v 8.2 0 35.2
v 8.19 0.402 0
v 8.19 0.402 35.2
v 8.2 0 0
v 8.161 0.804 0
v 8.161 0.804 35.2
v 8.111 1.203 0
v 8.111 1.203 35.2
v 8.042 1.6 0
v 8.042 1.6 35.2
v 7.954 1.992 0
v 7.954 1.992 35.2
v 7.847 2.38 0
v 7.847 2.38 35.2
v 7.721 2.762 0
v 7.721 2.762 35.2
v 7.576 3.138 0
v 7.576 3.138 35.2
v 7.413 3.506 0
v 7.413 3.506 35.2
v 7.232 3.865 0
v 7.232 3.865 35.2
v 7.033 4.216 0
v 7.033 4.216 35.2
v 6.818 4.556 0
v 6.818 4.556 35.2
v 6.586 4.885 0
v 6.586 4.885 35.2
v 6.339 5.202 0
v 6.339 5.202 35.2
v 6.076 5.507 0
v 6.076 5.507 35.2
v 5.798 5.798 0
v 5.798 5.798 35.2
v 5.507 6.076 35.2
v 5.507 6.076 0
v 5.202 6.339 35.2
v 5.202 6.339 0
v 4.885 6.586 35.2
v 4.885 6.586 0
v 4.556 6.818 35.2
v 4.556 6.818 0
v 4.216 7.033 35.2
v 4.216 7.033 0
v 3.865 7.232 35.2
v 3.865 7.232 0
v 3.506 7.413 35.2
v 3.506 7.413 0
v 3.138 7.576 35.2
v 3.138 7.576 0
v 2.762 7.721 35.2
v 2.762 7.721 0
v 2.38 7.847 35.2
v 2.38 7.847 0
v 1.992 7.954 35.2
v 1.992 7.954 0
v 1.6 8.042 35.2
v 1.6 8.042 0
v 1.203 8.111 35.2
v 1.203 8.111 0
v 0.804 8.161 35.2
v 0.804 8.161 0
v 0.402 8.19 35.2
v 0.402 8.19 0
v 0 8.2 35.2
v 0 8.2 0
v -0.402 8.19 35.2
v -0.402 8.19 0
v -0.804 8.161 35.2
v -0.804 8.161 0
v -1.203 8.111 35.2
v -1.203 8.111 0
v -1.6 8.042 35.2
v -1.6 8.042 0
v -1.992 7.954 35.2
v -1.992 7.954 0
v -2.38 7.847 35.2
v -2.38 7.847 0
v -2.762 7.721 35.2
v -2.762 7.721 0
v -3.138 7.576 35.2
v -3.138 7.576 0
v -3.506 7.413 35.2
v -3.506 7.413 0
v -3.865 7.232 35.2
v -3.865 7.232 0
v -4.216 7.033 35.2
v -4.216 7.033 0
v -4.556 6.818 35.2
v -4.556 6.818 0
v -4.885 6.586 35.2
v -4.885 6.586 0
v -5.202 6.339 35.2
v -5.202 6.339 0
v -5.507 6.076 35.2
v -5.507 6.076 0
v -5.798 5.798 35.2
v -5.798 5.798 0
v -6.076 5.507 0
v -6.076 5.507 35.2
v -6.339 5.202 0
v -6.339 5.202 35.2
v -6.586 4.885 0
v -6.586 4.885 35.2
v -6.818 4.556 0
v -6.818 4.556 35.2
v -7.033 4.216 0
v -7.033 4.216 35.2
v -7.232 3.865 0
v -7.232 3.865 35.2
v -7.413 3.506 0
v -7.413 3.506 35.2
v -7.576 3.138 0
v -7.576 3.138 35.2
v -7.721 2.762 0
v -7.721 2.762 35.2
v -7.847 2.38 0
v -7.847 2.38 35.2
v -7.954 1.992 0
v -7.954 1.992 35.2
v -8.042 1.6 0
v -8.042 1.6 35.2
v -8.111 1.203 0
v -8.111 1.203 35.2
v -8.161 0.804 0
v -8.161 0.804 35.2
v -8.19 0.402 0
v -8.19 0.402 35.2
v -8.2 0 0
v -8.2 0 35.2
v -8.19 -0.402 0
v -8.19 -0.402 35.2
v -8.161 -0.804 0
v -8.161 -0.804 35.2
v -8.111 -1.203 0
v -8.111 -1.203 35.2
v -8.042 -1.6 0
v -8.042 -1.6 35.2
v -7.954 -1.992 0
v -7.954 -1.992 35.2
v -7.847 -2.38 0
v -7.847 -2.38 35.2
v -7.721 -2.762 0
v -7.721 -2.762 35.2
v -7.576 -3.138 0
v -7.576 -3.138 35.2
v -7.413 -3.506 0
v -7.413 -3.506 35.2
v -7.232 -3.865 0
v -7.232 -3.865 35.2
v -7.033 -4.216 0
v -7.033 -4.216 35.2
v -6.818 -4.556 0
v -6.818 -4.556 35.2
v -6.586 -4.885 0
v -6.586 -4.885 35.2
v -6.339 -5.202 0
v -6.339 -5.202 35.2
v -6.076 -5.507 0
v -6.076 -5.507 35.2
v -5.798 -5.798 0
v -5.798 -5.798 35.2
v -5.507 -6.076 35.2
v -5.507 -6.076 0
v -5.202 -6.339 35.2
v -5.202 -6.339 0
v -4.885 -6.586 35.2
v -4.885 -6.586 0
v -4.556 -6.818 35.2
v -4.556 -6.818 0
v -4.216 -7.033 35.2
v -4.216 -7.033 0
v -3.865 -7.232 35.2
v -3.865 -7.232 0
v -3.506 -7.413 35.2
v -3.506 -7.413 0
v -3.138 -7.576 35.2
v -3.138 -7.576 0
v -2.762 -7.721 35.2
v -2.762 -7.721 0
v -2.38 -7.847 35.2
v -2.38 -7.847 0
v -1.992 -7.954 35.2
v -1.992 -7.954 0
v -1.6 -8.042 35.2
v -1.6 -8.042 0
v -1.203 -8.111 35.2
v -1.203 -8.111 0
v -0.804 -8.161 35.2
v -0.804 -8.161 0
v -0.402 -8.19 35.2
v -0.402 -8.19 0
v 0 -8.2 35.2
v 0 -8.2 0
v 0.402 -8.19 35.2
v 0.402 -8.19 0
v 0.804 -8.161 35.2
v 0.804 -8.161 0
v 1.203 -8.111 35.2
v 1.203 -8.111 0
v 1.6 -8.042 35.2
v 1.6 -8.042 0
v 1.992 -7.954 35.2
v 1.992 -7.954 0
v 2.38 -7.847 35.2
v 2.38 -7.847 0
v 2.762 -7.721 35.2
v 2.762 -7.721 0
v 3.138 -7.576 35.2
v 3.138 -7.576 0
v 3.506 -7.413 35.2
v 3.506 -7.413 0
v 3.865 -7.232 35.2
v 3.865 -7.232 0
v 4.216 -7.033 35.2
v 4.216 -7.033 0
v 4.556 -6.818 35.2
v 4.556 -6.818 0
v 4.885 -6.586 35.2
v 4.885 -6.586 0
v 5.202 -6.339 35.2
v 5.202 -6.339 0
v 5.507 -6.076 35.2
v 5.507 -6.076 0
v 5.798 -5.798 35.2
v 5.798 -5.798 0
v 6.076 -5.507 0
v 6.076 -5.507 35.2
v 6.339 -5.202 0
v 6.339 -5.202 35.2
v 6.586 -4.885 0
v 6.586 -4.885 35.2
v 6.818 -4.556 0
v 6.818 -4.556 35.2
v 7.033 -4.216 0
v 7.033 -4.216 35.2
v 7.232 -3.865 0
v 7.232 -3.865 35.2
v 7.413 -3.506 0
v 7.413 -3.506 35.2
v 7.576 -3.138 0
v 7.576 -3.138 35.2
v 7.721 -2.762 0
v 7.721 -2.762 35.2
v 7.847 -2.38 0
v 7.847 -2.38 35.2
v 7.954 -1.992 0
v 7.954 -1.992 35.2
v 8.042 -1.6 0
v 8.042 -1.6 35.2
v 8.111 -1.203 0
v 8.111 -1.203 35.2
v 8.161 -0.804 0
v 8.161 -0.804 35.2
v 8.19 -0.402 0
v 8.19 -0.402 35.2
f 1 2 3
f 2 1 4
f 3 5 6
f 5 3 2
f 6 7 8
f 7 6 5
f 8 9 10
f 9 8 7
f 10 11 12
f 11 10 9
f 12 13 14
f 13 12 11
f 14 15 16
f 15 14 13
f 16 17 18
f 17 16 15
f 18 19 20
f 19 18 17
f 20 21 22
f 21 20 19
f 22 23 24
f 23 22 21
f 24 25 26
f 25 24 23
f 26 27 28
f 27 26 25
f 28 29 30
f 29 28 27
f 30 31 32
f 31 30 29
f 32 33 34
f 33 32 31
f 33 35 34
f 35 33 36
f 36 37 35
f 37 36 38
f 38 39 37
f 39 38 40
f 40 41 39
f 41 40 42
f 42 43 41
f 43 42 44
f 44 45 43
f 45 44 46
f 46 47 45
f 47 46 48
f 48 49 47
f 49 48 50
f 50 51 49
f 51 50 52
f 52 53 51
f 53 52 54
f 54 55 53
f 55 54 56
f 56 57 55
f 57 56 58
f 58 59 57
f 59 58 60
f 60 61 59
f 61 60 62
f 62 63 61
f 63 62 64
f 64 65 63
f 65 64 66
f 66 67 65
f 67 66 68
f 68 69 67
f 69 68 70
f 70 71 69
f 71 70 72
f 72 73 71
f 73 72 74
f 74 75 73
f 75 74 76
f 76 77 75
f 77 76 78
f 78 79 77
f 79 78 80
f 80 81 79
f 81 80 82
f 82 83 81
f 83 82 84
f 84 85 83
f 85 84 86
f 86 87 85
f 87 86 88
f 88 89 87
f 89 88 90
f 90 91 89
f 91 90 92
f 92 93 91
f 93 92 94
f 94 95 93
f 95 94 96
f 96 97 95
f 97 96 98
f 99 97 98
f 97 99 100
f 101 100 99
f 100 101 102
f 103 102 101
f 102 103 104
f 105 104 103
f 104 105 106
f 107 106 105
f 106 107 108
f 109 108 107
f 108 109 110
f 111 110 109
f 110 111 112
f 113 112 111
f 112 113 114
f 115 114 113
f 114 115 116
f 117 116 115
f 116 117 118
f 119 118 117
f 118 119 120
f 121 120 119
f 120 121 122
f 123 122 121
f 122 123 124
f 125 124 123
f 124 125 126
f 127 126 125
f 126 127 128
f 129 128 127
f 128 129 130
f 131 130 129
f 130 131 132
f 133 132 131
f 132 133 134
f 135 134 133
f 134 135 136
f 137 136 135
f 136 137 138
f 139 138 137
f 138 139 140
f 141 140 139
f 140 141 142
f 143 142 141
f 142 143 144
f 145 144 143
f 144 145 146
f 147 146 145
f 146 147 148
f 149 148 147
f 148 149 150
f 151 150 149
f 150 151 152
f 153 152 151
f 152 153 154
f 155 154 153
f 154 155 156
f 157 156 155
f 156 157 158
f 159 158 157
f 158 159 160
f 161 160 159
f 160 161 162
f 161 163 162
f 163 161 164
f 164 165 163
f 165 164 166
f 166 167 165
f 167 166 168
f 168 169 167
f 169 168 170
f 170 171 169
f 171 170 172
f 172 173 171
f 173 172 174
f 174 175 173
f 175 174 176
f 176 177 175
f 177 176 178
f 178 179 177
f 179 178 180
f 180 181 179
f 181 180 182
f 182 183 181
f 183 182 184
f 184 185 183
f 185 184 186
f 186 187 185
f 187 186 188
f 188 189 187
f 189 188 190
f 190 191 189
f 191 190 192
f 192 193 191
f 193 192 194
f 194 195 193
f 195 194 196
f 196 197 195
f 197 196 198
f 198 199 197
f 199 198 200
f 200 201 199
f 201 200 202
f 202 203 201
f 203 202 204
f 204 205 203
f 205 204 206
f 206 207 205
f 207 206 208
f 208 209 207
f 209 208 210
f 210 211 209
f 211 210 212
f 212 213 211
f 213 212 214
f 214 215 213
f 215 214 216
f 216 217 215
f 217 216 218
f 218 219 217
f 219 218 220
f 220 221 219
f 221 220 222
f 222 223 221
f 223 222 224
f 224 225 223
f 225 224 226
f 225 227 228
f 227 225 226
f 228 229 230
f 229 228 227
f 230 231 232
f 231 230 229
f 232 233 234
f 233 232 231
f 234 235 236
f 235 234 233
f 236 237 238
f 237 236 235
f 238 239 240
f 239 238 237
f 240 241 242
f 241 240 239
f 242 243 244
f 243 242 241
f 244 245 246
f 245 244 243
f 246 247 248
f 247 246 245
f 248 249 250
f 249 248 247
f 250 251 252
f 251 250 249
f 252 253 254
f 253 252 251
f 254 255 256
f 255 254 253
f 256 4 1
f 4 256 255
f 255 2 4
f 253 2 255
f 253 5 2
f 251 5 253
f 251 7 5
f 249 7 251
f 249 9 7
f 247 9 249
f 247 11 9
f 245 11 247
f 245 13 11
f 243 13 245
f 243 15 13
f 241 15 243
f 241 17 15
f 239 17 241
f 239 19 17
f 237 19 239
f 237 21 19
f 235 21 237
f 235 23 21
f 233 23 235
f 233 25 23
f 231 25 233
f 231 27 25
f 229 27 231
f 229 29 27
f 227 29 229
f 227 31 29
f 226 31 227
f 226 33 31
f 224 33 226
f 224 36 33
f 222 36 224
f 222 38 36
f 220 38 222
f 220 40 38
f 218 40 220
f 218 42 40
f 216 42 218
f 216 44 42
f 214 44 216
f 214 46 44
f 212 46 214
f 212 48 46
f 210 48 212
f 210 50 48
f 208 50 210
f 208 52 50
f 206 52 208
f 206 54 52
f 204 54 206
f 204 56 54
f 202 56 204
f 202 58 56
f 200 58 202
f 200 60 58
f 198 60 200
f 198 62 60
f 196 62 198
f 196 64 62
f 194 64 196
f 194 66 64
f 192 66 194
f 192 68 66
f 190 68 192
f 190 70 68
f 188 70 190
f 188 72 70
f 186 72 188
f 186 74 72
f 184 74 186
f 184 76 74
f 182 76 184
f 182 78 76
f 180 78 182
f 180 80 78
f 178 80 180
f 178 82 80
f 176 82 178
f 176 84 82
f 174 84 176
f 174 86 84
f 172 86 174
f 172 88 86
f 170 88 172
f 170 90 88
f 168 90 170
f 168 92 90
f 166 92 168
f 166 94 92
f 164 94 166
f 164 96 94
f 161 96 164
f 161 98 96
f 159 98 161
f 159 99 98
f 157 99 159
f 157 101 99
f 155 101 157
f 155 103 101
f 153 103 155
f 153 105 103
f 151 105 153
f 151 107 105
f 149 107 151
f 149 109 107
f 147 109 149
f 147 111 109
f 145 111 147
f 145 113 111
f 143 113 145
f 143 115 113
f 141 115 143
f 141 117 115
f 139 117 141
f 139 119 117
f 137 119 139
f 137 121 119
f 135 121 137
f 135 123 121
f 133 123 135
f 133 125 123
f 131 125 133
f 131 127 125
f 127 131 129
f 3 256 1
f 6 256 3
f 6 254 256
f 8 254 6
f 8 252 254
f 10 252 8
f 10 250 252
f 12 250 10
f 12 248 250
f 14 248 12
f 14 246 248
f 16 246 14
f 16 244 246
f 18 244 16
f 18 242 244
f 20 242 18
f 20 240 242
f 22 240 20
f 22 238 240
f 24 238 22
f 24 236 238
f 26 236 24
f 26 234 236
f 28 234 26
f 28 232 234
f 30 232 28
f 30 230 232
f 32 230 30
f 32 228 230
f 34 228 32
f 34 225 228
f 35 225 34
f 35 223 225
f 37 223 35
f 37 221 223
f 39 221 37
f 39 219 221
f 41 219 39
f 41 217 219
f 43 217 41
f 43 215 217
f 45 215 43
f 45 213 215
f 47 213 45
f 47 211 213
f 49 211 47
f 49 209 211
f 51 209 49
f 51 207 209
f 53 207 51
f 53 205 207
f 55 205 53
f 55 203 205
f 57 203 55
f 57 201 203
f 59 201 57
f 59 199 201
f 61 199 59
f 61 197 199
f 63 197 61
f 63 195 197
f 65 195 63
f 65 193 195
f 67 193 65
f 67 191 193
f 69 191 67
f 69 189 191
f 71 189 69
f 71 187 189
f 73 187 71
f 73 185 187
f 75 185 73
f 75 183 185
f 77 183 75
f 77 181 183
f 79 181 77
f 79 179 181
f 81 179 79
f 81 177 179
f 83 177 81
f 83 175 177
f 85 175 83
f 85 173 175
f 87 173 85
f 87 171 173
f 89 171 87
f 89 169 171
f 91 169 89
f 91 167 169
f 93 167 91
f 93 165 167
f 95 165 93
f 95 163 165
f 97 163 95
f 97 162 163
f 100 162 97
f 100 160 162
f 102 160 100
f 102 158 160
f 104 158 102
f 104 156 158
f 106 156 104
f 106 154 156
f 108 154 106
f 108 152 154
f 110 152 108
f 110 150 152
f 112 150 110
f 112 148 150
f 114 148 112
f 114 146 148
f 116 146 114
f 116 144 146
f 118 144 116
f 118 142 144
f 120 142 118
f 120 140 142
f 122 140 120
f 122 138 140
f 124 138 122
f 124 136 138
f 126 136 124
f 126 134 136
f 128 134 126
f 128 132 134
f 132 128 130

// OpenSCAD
$fn = 128;

cell_height = 35.2;
cell_diameter = 16.4;

cylinder(h = cell_height, d = cell_diameter);
